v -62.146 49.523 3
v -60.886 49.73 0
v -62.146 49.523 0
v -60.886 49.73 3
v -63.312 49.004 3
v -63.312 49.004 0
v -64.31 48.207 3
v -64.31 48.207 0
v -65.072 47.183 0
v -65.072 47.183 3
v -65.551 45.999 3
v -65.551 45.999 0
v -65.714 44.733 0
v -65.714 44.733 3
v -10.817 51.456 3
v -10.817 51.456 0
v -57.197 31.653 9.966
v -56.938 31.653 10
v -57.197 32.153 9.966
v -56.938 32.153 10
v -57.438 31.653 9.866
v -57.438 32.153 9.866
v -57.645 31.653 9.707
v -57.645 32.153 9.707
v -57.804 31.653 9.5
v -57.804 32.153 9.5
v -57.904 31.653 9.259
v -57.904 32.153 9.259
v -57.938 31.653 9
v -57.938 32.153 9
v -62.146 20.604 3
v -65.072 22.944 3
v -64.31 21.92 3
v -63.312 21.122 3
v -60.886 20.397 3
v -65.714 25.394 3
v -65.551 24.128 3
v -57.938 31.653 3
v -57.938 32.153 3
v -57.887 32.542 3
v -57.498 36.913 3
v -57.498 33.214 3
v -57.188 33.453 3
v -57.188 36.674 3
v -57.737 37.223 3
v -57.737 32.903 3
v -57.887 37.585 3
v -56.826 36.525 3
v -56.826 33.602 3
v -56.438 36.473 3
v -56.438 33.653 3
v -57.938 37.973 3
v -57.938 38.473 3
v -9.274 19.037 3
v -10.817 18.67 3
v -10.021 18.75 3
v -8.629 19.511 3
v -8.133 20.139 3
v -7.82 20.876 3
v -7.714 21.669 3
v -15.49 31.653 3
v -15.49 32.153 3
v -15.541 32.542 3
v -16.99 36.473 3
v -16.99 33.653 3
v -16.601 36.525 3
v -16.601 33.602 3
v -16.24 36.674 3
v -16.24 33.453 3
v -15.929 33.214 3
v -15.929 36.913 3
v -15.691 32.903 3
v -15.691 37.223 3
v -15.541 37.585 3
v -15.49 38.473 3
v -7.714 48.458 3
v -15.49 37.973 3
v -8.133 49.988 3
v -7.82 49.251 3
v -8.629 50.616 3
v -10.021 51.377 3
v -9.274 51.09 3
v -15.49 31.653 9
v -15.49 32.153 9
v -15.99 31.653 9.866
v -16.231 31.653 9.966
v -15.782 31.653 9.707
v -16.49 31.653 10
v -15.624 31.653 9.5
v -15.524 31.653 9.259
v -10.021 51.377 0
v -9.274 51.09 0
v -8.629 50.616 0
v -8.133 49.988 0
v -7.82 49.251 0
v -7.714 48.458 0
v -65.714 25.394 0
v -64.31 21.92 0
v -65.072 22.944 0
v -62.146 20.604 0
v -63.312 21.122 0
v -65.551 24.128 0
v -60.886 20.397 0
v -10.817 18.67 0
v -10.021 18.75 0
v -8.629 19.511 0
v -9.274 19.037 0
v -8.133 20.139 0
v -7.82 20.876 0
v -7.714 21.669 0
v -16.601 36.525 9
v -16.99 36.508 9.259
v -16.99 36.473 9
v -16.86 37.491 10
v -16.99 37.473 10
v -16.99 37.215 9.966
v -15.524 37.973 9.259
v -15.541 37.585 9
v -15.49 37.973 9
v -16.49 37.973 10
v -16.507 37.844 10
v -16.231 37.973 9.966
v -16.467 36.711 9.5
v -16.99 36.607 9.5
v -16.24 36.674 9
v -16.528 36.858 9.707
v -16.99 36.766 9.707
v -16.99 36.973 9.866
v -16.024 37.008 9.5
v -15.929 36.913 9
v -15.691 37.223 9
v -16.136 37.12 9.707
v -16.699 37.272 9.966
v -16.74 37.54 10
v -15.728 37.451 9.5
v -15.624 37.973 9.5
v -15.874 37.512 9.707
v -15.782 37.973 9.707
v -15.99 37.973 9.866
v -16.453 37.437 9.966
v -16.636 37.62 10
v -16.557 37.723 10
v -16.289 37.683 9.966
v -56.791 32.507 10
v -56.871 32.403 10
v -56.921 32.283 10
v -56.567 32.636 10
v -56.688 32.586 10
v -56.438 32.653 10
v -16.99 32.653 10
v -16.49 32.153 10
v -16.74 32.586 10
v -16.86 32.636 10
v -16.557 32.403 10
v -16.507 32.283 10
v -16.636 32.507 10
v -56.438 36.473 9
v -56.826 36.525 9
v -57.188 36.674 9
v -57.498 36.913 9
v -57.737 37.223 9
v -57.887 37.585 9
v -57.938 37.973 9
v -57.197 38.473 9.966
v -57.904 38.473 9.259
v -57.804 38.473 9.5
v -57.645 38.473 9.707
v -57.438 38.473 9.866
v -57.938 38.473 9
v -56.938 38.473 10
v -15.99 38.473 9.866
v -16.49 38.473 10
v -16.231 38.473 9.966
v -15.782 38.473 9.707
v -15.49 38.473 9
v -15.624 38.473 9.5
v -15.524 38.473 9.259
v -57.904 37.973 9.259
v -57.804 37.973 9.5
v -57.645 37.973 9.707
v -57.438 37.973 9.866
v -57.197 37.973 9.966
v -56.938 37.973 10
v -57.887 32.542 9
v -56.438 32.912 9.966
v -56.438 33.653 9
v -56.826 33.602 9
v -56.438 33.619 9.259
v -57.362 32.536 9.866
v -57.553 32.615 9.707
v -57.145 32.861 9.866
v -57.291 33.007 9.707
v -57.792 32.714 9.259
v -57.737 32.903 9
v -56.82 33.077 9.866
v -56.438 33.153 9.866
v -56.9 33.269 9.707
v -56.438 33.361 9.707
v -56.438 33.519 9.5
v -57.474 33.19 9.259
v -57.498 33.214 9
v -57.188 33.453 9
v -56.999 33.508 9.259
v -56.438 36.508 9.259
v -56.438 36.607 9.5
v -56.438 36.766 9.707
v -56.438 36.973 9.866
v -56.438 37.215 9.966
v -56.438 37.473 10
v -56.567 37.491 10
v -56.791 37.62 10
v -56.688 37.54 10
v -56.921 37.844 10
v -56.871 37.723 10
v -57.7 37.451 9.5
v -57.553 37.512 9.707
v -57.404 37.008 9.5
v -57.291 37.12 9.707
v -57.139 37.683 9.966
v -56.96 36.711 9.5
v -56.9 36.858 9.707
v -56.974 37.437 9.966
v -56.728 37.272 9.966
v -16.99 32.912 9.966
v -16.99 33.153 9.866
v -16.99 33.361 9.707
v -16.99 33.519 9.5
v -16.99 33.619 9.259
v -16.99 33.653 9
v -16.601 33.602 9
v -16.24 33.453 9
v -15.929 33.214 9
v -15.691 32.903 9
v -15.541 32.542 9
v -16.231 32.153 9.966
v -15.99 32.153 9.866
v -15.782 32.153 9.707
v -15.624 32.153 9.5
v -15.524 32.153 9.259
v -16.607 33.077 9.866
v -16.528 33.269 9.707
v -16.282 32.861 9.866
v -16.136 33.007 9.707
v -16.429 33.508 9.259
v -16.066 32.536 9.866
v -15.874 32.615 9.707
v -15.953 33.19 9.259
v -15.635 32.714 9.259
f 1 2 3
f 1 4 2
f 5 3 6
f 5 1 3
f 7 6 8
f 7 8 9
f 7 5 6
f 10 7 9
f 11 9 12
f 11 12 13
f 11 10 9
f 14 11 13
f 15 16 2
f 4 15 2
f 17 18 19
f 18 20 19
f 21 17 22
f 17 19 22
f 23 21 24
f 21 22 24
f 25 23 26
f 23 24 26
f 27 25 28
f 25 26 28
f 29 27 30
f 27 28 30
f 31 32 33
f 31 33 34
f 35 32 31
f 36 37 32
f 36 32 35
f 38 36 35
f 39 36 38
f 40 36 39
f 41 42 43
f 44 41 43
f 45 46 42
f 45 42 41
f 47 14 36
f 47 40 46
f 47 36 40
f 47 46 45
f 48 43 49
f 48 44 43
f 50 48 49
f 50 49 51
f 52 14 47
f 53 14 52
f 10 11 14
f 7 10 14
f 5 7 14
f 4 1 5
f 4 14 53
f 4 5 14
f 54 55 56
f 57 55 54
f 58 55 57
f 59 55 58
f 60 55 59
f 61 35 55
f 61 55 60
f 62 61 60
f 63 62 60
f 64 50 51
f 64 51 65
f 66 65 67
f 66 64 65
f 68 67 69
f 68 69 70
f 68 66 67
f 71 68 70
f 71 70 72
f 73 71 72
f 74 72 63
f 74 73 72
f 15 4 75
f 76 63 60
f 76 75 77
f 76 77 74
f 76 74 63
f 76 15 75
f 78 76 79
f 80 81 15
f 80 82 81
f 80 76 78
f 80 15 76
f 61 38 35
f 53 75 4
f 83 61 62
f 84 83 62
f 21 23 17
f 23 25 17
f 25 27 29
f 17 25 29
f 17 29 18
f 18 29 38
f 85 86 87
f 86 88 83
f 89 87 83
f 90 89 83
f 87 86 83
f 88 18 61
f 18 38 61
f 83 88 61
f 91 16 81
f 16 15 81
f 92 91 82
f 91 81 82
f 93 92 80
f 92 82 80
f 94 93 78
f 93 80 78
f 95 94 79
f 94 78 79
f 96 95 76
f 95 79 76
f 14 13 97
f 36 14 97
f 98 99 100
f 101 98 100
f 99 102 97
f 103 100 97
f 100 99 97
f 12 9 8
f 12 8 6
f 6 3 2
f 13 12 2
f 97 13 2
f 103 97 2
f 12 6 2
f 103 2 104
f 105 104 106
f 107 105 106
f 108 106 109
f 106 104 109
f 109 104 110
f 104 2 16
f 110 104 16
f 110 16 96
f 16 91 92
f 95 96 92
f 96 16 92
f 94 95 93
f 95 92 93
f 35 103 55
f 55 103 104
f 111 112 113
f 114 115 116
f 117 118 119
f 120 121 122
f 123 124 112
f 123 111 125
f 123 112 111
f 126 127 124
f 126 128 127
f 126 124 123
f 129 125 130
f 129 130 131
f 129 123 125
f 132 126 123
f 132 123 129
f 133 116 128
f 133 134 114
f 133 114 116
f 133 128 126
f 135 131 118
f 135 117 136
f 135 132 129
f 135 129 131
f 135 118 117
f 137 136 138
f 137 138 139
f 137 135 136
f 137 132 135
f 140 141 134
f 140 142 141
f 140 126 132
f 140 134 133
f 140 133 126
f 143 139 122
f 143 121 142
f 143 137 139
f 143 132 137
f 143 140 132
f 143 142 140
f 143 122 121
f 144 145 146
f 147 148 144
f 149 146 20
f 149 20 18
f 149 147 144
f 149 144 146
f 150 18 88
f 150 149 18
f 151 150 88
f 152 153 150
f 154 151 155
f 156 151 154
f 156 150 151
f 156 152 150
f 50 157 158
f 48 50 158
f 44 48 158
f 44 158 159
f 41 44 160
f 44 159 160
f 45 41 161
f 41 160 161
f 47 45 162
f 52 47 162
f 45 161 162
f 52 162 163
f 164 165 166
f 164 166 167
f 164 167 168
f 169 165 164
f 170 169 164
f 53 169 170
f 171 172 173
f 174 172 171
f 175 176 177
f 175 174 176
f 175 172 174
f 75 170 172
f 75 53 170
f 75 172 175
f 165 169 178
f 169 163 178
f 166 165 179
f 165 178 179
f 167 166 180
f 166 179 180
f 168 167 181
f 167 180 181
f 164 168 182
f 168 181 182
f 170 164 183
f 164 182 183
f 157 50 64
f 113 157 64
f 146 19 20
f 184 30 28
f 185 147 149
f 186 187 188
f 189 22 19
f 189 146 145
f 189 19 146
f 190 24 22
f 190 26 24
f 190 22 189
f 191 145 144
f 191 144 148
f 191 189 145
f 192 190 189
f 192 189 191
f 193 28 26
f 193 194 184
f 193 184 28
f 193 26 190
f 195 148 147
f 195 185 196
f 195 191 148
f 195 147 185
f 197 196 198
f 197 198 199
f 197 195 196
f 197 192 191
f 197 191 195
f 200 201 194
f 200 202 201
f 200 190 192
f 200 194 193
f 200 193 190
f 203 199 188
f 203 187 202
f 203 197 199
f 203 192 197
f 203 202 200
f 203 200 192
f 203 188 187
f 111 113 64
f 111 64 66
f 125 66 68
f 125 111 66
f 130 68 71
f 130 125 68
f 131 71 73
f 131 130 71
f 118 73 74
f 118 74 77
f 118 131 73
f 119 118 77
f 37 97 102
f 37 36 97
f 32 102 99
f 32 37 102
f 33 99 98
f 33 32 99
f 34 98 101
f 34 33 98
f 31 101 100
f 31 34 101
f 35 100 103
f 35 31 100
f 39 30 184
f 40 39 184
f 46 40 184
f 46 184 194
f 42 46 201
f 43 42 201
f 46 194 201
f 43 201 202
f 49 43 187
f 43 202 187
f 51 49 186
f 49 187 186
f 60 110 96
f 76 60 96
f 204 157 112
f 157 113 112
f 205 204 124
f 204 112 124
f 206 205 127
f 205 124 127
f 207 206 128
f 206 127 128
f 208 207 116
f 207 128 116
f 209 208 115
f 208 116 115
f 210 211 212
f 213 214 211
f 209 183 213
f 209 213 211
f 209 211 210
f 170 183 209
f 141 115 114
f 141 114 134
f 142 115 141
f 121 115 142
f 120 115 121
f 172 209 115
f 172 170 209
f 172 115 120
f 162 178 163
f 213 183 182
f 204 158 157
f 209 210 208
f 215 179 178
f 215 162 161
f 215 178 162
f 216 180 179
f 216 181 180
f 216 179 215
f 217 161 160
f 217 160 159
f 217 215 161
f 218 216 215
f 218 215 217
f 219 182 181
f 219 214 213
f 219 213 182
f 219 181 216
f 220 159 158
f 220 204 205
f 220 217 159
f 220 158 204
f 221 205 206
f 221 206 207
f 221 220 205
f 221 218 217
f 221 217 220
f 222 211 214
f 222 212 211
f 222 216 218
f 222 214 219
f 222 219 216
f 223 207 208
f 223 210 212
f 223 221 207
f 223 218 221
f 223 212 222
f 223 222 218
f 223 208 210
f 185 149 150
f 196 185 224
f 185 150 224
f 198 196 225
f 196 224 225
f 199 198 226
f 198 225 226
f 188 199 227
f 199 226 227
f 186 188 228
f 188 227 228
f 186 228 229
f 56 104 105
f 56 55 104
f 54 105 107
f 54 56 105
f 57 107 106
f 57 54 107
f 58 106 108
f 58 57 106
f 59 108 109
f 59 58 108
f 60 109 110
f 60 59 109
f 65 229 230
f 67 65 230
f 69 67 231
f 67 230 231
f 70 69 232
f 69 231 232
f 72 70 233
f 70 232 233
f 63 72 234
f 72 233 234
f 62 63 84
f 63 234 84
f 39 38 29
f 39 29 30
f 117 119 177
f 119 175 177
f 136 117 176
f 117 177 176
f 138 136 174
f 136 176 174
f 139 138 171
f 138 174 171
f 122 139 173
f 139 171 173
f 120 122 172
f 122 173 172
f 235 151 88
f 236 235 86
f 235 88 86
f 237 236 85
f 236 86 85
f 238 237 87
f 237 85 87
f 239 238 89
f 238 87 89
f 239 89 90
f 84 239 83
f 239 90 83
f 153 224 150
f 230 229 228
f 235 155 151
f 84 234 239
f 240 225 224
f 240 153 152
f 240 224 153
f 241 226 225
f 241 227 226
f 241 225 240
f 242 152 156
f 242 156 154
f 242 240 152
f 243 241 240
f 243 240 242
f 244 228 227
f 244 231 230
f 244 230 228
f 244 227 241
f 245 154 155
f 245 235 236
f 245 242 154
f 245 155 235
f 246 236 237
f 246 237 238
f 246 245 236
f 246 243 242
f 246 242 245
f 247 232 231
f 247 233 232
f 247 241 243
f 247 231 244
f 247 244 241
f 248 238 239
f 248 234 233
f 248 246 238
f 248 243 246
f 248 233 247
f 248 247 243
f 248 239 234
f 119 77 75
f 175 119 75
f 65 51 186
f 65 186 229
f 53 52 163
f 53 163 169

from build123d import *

# Parameters (mm, degrees)
F0_W     = 42.4481438452
F0_H     = 2
F1_DEPTH = 3
F2_DEPTH = 10
F3_R     = 1.5
F4_R     = 1
F5_R     = 3
F6_R     = 5


with BuildPart() as f1:
    # F0 (on Top) → F1 (new body)
    with BuildSketch(Plane.XY):
        Polygon((-65.7136544558, 49.5634722376), (-65.7136544558, 36.4734722376), (-65.7136544558, 35.0634722376), (-65.7136544558, 33.6534722376), (-65.7136544558, 20.5634722376), (-7.7136544558, 18.5634722376), (-7.7136544558, 51.5634722376), align=None)
        with Locations((-36.7136544558, 32.6534722376)):
            Rectangle(F0_W, F0_H, mode=Mode.SUBTRACT)
        with Locations((-36.7136544558, 37.4734722376)):
            Rectangle(F0_W, F0_H, mode=Mode.SUBTRACT)
    extrude(amount=F1_DEPTH)

    # F0 (on Top) → F2 (join)
    with BuildSketch(Plane.XY):
        with Locations((-36.7136544558, 32.6534722376)):
            Rectangle(F0_W, F0_H)
        with Locations((-36.7136544558, 37.4734722376)):
            Rectangle(F0_W, F0_H)
    extrude(amount=F2_DEPTH)

    # F3
    f3_edges = [f1.edges().sort_by_distance(p)[0] for p in [
        (-57.937726, 36.473472, 6.5),
        (-57.937726, 33.653472, 6.5),
        (-15.489583, 36.473472, 6.5),
        (-15.489583, 33.653472, 6.5),
    ]]
    fillet(f3_edges, radius=F3_R)

    # F4
    f4_edges = [f1.edges().sort_by_distance(p)[0] for p in [
        (-36.713654, 36.473472, 10),
        (-36.713654, 33.653472, 10),
        (-57.498387, 33.214132, 10),
        (-15.928922, 33.214132, 10),
        (-57.937726, 31.903472, 10),
        (-15.489583, 31.903472, 10),
        (-57.937726, 38.223472, 10),
        (-57.498387, 36.912812, 10),
        (-15.489583, 38.223472, 10),
        (-15.928922, 36.912812, 10),
    ]]
    fillet(f4_edges, radius=F4_R)

    # F5
    f5_edges = [f1.edges().sort_by_distance(p)[0] for p in [
        (-7.713654, 18.563472, 1.5),
        (-7.713654, 51.563472, 1.5),
    ]]
    fillet(f5_edges, radius=F5_R)

    # F6
    f6_edges = [f1.edges().sort_by_distance(p)[0] for p in [
        (-65.713654, 20.563472, 1.5),
        (-65.713654, 49.563472, 1.5),
    ]]
    fillet(f6_edges, radius=F6_R)


solid = f1.part
